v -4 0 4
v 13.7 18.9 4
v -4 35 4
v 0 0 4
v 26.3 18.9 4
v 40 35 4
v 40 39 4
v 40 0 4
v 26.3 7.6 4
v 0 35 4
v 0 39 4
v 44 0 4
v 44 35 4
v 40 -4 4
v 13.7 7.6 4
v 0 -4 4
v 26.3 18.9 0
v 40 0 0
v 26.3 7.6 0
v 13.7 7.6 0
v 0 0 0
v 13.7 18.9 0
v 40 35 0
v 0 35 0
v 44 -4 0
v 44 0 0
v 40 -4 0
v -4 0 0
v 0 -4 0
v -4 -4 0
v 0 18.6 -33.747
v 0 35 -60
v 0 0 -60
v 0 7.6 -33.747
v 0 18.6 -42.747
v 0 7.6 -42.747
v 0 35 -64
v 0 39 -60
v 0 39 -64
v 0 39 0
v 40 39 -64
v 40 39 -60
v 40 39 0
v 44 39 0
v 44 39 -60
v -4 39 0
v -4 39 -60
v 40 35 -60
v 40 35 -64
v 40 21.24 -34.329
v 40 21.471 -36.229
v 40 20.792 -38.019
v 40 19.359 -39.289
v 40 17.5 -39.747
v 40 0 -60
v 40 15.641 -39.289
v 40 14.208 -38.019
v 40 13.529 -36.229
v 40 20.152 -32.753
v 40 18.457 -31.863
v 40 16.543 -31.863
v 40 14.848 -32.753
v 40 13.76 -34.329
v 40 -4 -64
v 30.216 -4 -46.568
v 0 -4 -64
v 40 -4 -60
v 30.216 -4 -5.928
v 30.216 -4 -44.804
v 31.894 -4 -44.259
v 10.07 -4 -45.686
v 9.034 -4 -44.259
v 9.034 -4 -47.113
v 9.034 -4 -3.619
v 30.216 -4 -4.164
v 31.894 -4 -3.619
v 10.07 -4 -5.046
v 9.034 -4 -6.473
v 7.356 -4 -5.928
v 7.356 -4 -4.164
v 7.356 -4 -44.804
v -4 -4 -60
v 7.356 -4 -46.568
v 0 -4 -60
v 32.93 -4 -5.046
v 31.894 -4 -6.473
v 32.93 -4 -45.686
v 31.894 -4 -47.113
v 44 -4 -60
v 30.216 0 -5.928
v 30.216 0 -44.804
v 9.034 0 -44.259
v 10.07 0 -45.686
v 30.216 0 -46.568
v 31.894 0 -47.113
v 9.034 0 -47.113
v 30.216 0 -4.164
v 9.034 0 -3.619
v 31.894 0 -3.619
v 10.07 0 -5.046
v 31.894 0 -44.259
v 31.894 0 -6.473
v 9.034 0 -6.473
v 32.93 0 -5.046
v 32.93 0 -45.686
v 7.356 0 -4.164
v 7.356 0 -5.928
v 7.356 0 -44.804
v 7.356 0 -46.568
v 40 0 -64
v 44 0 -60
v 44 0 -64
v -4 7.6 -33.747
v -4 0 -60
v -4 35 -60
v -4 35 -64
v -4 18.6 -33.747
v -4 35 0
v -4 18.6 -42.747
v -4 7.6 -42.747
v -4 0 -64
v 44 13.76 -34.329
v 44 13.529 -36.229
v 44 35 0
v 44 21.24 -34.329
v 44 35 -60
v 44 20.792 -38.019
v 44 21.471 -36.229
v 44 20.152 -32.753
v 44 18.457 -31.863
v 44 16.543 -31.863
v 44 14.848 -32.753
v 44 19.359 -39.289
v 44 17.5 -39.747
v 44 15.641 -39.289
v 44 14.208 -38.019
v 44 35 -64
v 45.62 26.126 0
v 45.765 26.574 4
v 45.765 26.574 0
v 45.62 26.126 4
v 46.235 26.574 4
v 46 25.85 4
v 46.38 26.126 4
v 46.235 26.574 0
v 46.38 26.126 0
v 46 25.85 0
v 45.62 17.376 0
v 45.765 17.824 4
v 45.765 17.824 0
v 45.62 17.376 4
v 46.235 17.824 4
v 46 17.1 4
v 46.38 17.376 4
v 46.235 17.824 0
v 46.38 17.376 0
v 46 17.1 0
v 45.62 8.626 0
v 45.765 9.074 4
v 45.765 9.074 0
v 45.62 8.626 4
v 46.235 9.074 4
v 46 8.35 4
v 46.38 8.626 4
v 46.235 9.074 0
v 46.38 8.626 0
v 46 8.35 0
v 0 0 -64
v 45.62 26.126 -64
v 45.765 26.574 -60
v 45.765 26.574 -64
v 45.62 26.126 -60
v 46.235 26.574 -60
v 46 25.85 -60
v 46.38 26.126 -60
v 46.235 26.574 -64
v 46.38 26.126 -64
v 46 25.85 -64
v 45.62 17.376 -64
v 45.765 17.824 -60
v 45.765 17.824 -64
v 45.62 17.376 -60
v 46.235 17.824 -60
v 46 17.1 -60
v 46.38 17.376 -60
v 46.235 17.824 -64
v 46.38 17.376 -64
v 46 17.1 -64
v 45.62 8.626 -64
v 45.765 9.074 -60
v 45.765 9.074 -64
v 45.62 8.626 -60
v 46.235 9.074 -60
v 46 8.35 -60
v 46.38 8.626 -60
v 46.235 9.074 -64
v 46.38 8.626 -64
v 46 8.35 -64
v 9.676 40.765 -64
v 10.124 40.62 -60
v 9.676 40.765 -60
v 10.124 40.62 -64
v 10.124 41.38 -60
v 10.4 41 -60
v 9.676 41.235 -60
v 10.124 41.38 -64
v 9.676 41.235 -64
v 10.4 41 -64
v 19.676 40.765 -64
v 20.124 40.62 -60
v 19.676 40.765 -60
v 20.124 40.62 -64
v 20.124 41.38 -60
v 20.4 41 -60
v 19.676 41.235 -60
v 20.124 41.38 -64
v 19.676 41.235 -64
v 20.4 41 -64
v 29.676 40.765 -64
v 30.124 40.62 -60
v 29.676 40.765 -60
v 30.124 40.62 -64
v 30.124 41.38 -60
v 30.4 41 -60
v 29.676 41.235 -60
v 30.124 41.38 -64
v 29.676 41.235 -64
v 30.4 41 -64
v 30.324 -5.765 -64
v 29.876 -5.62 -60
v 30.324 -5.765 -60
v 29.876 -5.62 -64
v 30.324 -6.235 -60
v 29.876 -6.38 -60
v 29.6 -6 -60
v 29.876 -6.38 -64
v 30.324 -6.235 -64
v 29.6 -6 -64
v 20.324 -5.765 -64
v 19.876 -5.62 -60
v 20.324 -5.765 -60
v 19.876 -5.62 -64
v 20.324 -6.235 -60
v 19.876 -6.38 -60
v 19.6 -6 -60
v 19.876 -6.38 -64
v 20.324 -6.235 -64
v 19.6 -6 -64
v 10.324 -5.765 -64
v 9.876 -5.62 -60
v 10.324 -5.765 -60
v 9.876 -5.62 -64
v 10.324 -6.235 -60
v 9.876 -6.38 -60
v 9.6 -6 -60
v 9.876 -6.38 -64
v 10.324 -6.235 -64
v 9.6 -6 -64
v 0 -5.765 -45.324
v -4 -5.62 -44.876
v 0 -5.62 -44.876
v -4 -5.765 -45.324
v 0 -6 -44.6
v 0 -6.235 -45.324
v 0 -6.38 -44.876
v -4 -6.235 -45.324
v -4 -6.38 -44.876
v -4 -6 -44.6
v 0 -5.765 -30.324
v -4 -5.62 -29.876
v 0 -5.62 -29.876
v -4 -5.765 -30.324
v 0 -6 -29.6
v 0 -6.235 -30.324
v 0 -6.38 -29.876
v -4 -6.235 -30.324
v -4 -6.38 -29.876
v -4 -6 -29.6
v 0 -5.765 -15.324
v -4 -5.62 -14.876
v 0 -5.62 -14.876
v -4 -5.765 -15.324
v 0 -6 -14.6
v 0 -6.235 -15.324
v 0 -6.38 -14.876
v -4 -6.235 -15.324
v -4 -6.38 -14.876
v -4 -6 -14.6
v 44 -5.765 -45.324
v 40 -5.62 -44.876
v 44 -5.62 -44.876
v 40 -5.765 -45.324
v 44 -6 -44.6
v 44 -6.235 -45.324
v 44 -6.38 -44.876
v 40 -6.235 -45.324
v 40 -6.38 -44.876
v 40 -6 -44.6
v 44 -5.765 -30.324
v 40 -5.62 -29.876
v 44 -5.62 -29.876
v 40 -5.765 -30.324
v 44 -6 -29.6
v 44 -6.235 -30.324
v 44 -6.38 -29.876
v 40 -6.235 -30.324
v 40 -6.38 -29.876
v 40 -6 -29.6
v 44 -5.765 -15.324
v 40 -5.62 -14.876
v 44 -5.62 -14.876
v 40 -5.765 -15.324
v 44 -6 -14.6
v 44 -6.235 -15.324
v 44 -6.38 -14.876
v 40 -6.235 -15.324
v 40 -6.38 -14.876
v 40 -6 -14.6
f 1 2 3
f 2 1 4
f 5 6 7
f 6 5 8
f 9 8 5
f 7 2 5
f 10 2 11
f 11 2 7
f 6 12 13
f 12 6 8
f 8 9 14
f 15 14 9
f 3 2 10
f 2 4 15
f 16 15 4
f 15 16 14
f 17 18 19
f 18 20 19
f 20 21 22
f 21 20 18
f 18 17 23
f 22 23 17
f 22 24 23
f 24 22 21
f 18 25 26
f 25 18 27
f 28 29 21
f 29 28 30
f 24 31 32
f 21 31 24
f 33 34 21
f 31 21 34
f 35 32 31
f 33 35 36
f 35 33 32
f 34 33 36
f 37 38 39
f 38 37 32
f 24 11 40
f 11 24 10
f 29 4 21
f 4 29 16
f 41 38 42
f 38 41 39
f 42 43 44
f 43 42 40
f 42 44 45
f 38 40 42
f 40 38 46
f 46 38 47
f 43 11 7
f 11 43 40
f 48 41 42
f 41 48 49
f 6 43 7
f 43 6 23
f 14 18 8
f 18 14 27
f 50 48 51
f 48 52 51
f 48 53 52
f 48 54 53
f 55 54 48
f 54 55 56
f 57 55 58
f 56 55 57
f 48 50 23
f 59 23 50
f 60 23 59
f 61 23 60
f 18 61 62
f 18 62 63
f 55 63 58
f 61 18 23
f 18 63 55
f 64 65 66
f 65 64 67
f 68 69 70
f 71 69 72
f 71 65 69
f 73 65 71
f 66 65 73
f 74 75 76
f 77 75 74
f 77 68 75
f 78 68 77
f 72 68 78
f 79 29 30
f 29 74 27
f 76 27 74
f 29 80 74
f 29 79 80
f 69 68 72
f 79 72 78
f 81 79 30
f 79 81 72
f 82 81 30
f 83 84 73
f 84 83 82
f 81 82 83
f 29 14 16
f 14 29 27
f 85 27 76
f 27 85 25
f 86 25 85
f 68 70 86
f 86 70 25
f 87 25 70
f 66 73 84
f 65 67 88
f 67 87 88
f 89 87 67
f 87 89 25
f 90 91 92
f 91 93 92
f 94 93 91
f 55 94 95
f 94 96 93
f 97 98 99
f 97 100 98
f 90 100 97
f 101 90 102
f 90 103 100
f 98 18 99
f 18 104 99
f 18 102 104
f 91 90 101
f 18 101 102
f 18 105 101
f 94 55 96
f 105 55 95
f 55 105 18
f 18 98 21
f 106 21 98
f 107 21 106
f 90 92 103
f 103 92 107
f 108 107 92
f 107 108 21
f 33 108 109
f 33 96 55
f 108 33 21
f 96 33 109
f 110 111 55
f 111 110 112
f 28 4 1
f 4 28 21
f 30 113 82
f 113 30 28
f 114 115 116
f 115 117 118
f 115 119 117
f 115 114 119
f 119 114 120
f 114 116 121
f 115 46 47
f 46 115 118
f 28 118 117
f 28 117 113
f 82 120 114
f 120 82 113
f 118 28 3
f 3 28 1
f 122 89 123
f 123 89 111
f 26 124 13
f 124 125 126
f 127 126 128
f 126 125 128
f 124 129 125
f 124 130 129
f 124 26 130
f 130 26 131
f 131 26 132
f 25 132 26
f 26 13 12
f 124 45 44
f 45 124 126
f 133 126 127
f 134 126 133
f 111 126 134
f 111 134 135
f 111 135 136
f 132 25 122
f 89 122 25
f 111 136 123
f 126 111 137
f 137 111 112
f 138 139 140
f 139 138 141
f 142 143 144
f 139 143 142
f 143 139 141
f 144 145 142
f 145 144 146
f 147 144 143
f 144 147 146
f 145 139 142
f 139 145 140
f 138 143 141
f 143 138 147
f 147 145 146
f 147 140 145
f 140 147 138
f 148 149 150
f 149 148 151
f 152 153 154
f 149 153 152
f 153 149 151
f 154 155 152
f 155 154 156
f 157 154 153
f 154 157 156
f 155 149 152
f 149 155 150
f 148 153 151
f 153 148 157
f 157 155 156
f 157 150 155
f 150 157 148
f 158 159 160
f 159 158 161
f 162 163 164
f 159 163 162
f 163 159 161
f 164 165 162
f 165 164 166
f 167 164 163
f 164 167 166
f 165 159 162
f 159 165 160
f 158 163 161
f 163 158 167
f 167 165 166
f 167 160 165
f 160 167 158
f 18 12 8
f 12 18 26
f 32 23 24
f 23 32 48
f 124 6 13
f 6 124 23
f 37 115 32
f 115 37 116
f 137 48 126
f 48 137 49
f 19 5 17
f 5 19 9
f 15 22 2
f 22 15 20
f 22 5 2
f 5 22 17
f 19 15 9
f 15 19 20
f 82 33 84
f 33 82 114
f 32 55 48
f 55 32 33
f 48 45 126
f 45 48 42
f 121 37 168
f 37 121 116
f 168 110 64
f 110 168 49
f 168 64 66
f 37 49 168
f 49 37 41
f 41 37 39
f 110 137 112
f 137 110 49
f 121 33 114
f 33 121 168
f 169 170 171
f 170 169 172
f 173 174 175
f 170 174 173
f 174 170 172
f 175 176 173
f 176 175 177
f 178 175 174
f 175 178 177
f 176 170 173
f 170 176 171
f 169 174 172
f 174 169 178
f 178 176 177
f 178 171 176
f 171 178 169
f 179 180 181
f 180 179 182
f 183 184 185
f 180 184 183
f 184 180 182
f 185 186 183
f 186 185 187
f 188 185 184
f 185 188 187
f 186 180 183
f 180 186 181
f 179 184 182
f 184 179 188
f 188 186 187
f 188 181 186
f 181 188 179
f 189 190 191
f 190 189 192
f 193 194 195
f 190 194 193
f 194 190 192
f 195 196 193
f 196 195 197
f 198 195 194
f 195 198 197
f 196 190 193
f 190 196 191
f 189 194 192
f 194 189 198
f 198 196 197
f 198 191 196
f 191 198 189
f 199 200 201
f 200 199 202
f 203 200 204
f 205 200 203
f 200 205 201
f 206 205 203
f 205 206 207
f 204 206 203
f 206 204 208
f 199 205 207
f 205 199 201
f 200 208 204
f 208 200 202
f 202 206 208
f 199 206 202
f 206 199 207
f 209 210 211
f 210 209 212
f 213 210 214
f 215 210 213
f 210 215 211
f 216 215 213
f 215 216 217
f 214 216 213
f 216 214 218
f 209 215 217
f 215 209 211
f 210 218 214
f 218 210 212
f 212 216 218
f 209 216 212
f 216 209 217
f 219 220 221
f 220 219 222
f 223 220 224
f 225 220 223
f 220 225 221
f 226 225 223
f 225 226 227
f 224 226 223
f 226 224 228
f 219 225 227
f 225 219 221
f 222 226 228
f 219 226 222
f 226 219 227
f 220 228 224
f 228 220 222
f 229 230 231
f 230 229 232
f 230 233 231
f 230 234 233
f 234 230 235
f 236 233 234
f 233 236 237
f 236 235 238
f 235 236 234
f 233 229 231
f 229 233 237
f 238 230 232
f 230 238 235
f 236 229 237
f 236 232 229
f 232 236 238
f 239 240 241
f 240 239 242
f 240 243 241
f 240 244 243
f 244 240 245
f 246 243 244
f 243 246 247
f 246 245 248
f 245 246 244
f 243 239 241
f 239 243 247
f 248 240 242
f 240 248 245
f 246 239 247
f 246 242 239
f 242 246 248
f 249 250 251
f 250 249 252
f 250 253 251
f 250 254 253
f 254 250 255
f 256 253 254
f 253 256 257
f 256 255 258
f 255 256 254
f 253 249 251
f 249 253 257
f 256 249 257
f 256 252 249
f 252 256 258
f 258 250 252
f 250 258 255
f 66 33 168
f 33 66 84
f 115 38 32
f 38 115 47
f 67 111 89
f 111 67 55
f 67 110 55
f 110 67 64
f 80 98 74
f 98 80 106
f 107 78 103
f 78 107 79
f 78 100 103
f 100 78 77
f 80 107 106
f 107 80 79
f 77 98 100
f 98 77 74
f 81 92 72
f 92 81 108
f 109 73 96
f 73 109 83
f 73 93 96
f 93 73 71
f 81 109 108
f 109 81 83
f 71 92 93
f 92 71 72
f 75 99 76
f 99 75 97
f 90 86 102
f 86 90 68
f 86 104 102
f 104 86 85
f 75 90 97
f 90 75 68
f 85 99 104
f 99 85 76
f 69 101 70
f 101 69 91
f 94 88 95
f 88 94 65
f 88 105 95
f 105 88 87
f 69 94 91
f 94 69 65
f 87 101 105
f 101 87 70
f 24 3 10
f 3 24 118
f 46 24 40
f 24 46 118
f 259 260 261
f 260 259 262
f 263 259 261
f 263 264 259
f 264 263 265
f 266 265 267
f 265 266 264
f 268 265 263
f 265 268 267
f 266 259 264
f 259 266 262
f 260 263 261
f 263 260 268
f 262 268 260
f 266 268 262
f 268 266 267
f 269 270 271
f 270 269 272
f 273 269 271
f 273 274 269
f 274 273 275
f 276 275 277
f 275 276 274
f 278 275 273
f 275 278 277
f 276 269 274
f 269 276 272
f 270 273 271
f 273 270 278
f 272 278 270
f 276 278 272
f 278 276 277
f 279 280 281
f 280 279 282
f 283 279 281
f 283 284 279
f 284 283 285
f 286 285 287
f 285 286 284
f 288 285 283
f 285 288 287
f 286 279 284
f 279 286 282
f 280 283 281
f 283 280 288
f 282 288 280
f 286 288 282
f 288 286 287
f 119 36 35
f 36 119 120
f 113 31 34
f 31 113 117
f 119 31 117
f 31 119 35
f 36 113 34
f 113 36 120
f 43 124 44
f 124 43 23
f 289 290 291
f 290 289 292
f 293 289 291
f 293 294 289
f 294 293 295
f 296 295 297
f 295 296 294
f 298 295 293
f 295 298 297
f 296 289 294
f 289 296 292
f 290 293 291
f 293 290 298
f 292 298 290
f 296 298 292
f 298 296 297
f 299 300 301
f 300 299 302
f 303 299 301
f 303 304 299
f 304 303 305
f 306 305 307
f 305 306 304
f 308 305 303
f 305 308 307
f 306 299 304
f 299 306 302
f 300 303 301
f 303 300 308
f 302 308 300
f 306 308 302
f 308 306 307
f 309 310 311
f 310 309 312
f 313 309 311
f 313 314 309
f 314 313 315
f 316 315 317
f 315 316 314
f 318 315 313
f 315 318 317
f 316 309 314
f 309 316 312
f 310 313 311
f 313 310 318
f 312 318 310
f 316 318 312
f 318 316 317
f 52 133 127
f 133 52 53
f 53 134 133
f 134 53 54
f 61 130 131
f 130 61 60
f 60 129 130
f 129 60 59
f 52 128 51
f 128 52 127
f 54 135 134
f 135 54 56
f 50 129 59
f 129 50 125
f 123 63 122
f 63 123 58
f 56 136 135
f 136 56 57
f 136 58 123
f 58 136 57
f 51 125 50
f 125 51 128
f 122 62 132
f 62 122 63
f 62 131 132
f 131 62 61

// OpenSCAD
include <lasercut/lasercut.scad>; 


thickness = 4;
pcb = 1.6;
x = 40;
y = 35;
z = 60; 

//usb_cutout = [ 12.6, 11.3] ];

screw_dist_x = 22.860;
screw_offset_x = (x - screw_dist_x)/2;
screw_offset_y = 4.546 + 0.5;// - (3.823 - 3); // dist(hole, board_edge) - (dist(board_edge, usb_edge) - thickness)
screw_dist_y = 40.64;
screw_holes = [
                [1.5, screw_offset_x, screw_offset_y],
                [1.5, screw_offset_x, screw_offset_y + screw_dist_y],
                [1.5, screw_offset_x+screw_dist_x, screw_offset_y],
                [1.5, screw_offset_x+screw_dist_x, screw_offset_y + screw_dist_y]
              ];

module front() {
    union() {
        lasercutoutSquare(thickness=thickness, x=x, y=y,
            bumpy_finger_joints=[
                    [UP, 1, 4],
                    [DOWN, 1, 4],
                    [LEFT, 1, 4],
                    [RIGHT, 0, 4],
                ],
            cutouts = [[x/2-12.6/2,2+pcb+thickness, 12.6, 11.3]]
        );
    }
}
color("Orange",0.75)
    front();

module back() {
translate([0,0,-z - thickness]){
    union() {
        lasercutoutSquare(thickness=thickness, x=x, y=y,
            bumpy_finger_joints=[
                    [UP, 0, 4],
                    [DOWN, 0, 4],
                    [LEFT, 1, 4],
                    [RIGHT, 0, 4],
                ]
        );
    }
}
}
color("Cyan",0.75)
    back();


module top() {
translate([0,y,0])
    rotate([-90,0,0]) {
        union() {
            lasercutoutSquare(thickness=thickness, x=x, y=z,
                finger_joints=[
                        [UP, 1, 4],
                        [DOWN, 1, 4],
                        [LEFT, 0, 4],
                        [RIGHT, 1, 4]
                    ]
            );
        }

}
}

color("Green",0.75)
    top();

color("Green",0.75)
// bottom
translate([0,0-thickness,0])
    rotate([-90,0,0]) 
    lasercutoutSquare(thickness=thickness, x=x, y=z,
        finger_joints=[
                [UP, 0, 4],
                [DOWN, 0, 4],
                [LEFT, 0, 4],
                [RIGHT, 1, 4]
            ],
        circles_remove = screw_holes        
    );
    
color("Gold",0.75)
// left
translate([-thickness,0,0])
    rotate([0,90,0]) 
    lasercutoutSquare(thickness=thickness, x=z, y=y,
        finger_joints=[
                [LEFT, 0, 4],
                [RIGHT, 1, 4]
            ],
        bumpy_finger_joints=[
                [UP, 1, 4],
                [DOWN, 0, 4]
        ],
        cutouts = [[screw_offset_y + 28.701, 2+pcb+thickness, 9, 11]]
    );
    
color("Gold",0.75)
// right
translate([x,0,0])
    rotate([0,90,0]) 
    lasercutoutSquare(thickness=thickness, x=z, y=y,
        finger_joints=[
                [LEFT, 0, 4],
                [RIGHT, 1, 4]
            ],
        bumpy_finger_joints=[
                [UP, 1, 4],
                [DOWN, 0, 4],        
            ],
         circles_remove=[[4, screw_offset_y + 28.701 +2, y/2]]
    );
